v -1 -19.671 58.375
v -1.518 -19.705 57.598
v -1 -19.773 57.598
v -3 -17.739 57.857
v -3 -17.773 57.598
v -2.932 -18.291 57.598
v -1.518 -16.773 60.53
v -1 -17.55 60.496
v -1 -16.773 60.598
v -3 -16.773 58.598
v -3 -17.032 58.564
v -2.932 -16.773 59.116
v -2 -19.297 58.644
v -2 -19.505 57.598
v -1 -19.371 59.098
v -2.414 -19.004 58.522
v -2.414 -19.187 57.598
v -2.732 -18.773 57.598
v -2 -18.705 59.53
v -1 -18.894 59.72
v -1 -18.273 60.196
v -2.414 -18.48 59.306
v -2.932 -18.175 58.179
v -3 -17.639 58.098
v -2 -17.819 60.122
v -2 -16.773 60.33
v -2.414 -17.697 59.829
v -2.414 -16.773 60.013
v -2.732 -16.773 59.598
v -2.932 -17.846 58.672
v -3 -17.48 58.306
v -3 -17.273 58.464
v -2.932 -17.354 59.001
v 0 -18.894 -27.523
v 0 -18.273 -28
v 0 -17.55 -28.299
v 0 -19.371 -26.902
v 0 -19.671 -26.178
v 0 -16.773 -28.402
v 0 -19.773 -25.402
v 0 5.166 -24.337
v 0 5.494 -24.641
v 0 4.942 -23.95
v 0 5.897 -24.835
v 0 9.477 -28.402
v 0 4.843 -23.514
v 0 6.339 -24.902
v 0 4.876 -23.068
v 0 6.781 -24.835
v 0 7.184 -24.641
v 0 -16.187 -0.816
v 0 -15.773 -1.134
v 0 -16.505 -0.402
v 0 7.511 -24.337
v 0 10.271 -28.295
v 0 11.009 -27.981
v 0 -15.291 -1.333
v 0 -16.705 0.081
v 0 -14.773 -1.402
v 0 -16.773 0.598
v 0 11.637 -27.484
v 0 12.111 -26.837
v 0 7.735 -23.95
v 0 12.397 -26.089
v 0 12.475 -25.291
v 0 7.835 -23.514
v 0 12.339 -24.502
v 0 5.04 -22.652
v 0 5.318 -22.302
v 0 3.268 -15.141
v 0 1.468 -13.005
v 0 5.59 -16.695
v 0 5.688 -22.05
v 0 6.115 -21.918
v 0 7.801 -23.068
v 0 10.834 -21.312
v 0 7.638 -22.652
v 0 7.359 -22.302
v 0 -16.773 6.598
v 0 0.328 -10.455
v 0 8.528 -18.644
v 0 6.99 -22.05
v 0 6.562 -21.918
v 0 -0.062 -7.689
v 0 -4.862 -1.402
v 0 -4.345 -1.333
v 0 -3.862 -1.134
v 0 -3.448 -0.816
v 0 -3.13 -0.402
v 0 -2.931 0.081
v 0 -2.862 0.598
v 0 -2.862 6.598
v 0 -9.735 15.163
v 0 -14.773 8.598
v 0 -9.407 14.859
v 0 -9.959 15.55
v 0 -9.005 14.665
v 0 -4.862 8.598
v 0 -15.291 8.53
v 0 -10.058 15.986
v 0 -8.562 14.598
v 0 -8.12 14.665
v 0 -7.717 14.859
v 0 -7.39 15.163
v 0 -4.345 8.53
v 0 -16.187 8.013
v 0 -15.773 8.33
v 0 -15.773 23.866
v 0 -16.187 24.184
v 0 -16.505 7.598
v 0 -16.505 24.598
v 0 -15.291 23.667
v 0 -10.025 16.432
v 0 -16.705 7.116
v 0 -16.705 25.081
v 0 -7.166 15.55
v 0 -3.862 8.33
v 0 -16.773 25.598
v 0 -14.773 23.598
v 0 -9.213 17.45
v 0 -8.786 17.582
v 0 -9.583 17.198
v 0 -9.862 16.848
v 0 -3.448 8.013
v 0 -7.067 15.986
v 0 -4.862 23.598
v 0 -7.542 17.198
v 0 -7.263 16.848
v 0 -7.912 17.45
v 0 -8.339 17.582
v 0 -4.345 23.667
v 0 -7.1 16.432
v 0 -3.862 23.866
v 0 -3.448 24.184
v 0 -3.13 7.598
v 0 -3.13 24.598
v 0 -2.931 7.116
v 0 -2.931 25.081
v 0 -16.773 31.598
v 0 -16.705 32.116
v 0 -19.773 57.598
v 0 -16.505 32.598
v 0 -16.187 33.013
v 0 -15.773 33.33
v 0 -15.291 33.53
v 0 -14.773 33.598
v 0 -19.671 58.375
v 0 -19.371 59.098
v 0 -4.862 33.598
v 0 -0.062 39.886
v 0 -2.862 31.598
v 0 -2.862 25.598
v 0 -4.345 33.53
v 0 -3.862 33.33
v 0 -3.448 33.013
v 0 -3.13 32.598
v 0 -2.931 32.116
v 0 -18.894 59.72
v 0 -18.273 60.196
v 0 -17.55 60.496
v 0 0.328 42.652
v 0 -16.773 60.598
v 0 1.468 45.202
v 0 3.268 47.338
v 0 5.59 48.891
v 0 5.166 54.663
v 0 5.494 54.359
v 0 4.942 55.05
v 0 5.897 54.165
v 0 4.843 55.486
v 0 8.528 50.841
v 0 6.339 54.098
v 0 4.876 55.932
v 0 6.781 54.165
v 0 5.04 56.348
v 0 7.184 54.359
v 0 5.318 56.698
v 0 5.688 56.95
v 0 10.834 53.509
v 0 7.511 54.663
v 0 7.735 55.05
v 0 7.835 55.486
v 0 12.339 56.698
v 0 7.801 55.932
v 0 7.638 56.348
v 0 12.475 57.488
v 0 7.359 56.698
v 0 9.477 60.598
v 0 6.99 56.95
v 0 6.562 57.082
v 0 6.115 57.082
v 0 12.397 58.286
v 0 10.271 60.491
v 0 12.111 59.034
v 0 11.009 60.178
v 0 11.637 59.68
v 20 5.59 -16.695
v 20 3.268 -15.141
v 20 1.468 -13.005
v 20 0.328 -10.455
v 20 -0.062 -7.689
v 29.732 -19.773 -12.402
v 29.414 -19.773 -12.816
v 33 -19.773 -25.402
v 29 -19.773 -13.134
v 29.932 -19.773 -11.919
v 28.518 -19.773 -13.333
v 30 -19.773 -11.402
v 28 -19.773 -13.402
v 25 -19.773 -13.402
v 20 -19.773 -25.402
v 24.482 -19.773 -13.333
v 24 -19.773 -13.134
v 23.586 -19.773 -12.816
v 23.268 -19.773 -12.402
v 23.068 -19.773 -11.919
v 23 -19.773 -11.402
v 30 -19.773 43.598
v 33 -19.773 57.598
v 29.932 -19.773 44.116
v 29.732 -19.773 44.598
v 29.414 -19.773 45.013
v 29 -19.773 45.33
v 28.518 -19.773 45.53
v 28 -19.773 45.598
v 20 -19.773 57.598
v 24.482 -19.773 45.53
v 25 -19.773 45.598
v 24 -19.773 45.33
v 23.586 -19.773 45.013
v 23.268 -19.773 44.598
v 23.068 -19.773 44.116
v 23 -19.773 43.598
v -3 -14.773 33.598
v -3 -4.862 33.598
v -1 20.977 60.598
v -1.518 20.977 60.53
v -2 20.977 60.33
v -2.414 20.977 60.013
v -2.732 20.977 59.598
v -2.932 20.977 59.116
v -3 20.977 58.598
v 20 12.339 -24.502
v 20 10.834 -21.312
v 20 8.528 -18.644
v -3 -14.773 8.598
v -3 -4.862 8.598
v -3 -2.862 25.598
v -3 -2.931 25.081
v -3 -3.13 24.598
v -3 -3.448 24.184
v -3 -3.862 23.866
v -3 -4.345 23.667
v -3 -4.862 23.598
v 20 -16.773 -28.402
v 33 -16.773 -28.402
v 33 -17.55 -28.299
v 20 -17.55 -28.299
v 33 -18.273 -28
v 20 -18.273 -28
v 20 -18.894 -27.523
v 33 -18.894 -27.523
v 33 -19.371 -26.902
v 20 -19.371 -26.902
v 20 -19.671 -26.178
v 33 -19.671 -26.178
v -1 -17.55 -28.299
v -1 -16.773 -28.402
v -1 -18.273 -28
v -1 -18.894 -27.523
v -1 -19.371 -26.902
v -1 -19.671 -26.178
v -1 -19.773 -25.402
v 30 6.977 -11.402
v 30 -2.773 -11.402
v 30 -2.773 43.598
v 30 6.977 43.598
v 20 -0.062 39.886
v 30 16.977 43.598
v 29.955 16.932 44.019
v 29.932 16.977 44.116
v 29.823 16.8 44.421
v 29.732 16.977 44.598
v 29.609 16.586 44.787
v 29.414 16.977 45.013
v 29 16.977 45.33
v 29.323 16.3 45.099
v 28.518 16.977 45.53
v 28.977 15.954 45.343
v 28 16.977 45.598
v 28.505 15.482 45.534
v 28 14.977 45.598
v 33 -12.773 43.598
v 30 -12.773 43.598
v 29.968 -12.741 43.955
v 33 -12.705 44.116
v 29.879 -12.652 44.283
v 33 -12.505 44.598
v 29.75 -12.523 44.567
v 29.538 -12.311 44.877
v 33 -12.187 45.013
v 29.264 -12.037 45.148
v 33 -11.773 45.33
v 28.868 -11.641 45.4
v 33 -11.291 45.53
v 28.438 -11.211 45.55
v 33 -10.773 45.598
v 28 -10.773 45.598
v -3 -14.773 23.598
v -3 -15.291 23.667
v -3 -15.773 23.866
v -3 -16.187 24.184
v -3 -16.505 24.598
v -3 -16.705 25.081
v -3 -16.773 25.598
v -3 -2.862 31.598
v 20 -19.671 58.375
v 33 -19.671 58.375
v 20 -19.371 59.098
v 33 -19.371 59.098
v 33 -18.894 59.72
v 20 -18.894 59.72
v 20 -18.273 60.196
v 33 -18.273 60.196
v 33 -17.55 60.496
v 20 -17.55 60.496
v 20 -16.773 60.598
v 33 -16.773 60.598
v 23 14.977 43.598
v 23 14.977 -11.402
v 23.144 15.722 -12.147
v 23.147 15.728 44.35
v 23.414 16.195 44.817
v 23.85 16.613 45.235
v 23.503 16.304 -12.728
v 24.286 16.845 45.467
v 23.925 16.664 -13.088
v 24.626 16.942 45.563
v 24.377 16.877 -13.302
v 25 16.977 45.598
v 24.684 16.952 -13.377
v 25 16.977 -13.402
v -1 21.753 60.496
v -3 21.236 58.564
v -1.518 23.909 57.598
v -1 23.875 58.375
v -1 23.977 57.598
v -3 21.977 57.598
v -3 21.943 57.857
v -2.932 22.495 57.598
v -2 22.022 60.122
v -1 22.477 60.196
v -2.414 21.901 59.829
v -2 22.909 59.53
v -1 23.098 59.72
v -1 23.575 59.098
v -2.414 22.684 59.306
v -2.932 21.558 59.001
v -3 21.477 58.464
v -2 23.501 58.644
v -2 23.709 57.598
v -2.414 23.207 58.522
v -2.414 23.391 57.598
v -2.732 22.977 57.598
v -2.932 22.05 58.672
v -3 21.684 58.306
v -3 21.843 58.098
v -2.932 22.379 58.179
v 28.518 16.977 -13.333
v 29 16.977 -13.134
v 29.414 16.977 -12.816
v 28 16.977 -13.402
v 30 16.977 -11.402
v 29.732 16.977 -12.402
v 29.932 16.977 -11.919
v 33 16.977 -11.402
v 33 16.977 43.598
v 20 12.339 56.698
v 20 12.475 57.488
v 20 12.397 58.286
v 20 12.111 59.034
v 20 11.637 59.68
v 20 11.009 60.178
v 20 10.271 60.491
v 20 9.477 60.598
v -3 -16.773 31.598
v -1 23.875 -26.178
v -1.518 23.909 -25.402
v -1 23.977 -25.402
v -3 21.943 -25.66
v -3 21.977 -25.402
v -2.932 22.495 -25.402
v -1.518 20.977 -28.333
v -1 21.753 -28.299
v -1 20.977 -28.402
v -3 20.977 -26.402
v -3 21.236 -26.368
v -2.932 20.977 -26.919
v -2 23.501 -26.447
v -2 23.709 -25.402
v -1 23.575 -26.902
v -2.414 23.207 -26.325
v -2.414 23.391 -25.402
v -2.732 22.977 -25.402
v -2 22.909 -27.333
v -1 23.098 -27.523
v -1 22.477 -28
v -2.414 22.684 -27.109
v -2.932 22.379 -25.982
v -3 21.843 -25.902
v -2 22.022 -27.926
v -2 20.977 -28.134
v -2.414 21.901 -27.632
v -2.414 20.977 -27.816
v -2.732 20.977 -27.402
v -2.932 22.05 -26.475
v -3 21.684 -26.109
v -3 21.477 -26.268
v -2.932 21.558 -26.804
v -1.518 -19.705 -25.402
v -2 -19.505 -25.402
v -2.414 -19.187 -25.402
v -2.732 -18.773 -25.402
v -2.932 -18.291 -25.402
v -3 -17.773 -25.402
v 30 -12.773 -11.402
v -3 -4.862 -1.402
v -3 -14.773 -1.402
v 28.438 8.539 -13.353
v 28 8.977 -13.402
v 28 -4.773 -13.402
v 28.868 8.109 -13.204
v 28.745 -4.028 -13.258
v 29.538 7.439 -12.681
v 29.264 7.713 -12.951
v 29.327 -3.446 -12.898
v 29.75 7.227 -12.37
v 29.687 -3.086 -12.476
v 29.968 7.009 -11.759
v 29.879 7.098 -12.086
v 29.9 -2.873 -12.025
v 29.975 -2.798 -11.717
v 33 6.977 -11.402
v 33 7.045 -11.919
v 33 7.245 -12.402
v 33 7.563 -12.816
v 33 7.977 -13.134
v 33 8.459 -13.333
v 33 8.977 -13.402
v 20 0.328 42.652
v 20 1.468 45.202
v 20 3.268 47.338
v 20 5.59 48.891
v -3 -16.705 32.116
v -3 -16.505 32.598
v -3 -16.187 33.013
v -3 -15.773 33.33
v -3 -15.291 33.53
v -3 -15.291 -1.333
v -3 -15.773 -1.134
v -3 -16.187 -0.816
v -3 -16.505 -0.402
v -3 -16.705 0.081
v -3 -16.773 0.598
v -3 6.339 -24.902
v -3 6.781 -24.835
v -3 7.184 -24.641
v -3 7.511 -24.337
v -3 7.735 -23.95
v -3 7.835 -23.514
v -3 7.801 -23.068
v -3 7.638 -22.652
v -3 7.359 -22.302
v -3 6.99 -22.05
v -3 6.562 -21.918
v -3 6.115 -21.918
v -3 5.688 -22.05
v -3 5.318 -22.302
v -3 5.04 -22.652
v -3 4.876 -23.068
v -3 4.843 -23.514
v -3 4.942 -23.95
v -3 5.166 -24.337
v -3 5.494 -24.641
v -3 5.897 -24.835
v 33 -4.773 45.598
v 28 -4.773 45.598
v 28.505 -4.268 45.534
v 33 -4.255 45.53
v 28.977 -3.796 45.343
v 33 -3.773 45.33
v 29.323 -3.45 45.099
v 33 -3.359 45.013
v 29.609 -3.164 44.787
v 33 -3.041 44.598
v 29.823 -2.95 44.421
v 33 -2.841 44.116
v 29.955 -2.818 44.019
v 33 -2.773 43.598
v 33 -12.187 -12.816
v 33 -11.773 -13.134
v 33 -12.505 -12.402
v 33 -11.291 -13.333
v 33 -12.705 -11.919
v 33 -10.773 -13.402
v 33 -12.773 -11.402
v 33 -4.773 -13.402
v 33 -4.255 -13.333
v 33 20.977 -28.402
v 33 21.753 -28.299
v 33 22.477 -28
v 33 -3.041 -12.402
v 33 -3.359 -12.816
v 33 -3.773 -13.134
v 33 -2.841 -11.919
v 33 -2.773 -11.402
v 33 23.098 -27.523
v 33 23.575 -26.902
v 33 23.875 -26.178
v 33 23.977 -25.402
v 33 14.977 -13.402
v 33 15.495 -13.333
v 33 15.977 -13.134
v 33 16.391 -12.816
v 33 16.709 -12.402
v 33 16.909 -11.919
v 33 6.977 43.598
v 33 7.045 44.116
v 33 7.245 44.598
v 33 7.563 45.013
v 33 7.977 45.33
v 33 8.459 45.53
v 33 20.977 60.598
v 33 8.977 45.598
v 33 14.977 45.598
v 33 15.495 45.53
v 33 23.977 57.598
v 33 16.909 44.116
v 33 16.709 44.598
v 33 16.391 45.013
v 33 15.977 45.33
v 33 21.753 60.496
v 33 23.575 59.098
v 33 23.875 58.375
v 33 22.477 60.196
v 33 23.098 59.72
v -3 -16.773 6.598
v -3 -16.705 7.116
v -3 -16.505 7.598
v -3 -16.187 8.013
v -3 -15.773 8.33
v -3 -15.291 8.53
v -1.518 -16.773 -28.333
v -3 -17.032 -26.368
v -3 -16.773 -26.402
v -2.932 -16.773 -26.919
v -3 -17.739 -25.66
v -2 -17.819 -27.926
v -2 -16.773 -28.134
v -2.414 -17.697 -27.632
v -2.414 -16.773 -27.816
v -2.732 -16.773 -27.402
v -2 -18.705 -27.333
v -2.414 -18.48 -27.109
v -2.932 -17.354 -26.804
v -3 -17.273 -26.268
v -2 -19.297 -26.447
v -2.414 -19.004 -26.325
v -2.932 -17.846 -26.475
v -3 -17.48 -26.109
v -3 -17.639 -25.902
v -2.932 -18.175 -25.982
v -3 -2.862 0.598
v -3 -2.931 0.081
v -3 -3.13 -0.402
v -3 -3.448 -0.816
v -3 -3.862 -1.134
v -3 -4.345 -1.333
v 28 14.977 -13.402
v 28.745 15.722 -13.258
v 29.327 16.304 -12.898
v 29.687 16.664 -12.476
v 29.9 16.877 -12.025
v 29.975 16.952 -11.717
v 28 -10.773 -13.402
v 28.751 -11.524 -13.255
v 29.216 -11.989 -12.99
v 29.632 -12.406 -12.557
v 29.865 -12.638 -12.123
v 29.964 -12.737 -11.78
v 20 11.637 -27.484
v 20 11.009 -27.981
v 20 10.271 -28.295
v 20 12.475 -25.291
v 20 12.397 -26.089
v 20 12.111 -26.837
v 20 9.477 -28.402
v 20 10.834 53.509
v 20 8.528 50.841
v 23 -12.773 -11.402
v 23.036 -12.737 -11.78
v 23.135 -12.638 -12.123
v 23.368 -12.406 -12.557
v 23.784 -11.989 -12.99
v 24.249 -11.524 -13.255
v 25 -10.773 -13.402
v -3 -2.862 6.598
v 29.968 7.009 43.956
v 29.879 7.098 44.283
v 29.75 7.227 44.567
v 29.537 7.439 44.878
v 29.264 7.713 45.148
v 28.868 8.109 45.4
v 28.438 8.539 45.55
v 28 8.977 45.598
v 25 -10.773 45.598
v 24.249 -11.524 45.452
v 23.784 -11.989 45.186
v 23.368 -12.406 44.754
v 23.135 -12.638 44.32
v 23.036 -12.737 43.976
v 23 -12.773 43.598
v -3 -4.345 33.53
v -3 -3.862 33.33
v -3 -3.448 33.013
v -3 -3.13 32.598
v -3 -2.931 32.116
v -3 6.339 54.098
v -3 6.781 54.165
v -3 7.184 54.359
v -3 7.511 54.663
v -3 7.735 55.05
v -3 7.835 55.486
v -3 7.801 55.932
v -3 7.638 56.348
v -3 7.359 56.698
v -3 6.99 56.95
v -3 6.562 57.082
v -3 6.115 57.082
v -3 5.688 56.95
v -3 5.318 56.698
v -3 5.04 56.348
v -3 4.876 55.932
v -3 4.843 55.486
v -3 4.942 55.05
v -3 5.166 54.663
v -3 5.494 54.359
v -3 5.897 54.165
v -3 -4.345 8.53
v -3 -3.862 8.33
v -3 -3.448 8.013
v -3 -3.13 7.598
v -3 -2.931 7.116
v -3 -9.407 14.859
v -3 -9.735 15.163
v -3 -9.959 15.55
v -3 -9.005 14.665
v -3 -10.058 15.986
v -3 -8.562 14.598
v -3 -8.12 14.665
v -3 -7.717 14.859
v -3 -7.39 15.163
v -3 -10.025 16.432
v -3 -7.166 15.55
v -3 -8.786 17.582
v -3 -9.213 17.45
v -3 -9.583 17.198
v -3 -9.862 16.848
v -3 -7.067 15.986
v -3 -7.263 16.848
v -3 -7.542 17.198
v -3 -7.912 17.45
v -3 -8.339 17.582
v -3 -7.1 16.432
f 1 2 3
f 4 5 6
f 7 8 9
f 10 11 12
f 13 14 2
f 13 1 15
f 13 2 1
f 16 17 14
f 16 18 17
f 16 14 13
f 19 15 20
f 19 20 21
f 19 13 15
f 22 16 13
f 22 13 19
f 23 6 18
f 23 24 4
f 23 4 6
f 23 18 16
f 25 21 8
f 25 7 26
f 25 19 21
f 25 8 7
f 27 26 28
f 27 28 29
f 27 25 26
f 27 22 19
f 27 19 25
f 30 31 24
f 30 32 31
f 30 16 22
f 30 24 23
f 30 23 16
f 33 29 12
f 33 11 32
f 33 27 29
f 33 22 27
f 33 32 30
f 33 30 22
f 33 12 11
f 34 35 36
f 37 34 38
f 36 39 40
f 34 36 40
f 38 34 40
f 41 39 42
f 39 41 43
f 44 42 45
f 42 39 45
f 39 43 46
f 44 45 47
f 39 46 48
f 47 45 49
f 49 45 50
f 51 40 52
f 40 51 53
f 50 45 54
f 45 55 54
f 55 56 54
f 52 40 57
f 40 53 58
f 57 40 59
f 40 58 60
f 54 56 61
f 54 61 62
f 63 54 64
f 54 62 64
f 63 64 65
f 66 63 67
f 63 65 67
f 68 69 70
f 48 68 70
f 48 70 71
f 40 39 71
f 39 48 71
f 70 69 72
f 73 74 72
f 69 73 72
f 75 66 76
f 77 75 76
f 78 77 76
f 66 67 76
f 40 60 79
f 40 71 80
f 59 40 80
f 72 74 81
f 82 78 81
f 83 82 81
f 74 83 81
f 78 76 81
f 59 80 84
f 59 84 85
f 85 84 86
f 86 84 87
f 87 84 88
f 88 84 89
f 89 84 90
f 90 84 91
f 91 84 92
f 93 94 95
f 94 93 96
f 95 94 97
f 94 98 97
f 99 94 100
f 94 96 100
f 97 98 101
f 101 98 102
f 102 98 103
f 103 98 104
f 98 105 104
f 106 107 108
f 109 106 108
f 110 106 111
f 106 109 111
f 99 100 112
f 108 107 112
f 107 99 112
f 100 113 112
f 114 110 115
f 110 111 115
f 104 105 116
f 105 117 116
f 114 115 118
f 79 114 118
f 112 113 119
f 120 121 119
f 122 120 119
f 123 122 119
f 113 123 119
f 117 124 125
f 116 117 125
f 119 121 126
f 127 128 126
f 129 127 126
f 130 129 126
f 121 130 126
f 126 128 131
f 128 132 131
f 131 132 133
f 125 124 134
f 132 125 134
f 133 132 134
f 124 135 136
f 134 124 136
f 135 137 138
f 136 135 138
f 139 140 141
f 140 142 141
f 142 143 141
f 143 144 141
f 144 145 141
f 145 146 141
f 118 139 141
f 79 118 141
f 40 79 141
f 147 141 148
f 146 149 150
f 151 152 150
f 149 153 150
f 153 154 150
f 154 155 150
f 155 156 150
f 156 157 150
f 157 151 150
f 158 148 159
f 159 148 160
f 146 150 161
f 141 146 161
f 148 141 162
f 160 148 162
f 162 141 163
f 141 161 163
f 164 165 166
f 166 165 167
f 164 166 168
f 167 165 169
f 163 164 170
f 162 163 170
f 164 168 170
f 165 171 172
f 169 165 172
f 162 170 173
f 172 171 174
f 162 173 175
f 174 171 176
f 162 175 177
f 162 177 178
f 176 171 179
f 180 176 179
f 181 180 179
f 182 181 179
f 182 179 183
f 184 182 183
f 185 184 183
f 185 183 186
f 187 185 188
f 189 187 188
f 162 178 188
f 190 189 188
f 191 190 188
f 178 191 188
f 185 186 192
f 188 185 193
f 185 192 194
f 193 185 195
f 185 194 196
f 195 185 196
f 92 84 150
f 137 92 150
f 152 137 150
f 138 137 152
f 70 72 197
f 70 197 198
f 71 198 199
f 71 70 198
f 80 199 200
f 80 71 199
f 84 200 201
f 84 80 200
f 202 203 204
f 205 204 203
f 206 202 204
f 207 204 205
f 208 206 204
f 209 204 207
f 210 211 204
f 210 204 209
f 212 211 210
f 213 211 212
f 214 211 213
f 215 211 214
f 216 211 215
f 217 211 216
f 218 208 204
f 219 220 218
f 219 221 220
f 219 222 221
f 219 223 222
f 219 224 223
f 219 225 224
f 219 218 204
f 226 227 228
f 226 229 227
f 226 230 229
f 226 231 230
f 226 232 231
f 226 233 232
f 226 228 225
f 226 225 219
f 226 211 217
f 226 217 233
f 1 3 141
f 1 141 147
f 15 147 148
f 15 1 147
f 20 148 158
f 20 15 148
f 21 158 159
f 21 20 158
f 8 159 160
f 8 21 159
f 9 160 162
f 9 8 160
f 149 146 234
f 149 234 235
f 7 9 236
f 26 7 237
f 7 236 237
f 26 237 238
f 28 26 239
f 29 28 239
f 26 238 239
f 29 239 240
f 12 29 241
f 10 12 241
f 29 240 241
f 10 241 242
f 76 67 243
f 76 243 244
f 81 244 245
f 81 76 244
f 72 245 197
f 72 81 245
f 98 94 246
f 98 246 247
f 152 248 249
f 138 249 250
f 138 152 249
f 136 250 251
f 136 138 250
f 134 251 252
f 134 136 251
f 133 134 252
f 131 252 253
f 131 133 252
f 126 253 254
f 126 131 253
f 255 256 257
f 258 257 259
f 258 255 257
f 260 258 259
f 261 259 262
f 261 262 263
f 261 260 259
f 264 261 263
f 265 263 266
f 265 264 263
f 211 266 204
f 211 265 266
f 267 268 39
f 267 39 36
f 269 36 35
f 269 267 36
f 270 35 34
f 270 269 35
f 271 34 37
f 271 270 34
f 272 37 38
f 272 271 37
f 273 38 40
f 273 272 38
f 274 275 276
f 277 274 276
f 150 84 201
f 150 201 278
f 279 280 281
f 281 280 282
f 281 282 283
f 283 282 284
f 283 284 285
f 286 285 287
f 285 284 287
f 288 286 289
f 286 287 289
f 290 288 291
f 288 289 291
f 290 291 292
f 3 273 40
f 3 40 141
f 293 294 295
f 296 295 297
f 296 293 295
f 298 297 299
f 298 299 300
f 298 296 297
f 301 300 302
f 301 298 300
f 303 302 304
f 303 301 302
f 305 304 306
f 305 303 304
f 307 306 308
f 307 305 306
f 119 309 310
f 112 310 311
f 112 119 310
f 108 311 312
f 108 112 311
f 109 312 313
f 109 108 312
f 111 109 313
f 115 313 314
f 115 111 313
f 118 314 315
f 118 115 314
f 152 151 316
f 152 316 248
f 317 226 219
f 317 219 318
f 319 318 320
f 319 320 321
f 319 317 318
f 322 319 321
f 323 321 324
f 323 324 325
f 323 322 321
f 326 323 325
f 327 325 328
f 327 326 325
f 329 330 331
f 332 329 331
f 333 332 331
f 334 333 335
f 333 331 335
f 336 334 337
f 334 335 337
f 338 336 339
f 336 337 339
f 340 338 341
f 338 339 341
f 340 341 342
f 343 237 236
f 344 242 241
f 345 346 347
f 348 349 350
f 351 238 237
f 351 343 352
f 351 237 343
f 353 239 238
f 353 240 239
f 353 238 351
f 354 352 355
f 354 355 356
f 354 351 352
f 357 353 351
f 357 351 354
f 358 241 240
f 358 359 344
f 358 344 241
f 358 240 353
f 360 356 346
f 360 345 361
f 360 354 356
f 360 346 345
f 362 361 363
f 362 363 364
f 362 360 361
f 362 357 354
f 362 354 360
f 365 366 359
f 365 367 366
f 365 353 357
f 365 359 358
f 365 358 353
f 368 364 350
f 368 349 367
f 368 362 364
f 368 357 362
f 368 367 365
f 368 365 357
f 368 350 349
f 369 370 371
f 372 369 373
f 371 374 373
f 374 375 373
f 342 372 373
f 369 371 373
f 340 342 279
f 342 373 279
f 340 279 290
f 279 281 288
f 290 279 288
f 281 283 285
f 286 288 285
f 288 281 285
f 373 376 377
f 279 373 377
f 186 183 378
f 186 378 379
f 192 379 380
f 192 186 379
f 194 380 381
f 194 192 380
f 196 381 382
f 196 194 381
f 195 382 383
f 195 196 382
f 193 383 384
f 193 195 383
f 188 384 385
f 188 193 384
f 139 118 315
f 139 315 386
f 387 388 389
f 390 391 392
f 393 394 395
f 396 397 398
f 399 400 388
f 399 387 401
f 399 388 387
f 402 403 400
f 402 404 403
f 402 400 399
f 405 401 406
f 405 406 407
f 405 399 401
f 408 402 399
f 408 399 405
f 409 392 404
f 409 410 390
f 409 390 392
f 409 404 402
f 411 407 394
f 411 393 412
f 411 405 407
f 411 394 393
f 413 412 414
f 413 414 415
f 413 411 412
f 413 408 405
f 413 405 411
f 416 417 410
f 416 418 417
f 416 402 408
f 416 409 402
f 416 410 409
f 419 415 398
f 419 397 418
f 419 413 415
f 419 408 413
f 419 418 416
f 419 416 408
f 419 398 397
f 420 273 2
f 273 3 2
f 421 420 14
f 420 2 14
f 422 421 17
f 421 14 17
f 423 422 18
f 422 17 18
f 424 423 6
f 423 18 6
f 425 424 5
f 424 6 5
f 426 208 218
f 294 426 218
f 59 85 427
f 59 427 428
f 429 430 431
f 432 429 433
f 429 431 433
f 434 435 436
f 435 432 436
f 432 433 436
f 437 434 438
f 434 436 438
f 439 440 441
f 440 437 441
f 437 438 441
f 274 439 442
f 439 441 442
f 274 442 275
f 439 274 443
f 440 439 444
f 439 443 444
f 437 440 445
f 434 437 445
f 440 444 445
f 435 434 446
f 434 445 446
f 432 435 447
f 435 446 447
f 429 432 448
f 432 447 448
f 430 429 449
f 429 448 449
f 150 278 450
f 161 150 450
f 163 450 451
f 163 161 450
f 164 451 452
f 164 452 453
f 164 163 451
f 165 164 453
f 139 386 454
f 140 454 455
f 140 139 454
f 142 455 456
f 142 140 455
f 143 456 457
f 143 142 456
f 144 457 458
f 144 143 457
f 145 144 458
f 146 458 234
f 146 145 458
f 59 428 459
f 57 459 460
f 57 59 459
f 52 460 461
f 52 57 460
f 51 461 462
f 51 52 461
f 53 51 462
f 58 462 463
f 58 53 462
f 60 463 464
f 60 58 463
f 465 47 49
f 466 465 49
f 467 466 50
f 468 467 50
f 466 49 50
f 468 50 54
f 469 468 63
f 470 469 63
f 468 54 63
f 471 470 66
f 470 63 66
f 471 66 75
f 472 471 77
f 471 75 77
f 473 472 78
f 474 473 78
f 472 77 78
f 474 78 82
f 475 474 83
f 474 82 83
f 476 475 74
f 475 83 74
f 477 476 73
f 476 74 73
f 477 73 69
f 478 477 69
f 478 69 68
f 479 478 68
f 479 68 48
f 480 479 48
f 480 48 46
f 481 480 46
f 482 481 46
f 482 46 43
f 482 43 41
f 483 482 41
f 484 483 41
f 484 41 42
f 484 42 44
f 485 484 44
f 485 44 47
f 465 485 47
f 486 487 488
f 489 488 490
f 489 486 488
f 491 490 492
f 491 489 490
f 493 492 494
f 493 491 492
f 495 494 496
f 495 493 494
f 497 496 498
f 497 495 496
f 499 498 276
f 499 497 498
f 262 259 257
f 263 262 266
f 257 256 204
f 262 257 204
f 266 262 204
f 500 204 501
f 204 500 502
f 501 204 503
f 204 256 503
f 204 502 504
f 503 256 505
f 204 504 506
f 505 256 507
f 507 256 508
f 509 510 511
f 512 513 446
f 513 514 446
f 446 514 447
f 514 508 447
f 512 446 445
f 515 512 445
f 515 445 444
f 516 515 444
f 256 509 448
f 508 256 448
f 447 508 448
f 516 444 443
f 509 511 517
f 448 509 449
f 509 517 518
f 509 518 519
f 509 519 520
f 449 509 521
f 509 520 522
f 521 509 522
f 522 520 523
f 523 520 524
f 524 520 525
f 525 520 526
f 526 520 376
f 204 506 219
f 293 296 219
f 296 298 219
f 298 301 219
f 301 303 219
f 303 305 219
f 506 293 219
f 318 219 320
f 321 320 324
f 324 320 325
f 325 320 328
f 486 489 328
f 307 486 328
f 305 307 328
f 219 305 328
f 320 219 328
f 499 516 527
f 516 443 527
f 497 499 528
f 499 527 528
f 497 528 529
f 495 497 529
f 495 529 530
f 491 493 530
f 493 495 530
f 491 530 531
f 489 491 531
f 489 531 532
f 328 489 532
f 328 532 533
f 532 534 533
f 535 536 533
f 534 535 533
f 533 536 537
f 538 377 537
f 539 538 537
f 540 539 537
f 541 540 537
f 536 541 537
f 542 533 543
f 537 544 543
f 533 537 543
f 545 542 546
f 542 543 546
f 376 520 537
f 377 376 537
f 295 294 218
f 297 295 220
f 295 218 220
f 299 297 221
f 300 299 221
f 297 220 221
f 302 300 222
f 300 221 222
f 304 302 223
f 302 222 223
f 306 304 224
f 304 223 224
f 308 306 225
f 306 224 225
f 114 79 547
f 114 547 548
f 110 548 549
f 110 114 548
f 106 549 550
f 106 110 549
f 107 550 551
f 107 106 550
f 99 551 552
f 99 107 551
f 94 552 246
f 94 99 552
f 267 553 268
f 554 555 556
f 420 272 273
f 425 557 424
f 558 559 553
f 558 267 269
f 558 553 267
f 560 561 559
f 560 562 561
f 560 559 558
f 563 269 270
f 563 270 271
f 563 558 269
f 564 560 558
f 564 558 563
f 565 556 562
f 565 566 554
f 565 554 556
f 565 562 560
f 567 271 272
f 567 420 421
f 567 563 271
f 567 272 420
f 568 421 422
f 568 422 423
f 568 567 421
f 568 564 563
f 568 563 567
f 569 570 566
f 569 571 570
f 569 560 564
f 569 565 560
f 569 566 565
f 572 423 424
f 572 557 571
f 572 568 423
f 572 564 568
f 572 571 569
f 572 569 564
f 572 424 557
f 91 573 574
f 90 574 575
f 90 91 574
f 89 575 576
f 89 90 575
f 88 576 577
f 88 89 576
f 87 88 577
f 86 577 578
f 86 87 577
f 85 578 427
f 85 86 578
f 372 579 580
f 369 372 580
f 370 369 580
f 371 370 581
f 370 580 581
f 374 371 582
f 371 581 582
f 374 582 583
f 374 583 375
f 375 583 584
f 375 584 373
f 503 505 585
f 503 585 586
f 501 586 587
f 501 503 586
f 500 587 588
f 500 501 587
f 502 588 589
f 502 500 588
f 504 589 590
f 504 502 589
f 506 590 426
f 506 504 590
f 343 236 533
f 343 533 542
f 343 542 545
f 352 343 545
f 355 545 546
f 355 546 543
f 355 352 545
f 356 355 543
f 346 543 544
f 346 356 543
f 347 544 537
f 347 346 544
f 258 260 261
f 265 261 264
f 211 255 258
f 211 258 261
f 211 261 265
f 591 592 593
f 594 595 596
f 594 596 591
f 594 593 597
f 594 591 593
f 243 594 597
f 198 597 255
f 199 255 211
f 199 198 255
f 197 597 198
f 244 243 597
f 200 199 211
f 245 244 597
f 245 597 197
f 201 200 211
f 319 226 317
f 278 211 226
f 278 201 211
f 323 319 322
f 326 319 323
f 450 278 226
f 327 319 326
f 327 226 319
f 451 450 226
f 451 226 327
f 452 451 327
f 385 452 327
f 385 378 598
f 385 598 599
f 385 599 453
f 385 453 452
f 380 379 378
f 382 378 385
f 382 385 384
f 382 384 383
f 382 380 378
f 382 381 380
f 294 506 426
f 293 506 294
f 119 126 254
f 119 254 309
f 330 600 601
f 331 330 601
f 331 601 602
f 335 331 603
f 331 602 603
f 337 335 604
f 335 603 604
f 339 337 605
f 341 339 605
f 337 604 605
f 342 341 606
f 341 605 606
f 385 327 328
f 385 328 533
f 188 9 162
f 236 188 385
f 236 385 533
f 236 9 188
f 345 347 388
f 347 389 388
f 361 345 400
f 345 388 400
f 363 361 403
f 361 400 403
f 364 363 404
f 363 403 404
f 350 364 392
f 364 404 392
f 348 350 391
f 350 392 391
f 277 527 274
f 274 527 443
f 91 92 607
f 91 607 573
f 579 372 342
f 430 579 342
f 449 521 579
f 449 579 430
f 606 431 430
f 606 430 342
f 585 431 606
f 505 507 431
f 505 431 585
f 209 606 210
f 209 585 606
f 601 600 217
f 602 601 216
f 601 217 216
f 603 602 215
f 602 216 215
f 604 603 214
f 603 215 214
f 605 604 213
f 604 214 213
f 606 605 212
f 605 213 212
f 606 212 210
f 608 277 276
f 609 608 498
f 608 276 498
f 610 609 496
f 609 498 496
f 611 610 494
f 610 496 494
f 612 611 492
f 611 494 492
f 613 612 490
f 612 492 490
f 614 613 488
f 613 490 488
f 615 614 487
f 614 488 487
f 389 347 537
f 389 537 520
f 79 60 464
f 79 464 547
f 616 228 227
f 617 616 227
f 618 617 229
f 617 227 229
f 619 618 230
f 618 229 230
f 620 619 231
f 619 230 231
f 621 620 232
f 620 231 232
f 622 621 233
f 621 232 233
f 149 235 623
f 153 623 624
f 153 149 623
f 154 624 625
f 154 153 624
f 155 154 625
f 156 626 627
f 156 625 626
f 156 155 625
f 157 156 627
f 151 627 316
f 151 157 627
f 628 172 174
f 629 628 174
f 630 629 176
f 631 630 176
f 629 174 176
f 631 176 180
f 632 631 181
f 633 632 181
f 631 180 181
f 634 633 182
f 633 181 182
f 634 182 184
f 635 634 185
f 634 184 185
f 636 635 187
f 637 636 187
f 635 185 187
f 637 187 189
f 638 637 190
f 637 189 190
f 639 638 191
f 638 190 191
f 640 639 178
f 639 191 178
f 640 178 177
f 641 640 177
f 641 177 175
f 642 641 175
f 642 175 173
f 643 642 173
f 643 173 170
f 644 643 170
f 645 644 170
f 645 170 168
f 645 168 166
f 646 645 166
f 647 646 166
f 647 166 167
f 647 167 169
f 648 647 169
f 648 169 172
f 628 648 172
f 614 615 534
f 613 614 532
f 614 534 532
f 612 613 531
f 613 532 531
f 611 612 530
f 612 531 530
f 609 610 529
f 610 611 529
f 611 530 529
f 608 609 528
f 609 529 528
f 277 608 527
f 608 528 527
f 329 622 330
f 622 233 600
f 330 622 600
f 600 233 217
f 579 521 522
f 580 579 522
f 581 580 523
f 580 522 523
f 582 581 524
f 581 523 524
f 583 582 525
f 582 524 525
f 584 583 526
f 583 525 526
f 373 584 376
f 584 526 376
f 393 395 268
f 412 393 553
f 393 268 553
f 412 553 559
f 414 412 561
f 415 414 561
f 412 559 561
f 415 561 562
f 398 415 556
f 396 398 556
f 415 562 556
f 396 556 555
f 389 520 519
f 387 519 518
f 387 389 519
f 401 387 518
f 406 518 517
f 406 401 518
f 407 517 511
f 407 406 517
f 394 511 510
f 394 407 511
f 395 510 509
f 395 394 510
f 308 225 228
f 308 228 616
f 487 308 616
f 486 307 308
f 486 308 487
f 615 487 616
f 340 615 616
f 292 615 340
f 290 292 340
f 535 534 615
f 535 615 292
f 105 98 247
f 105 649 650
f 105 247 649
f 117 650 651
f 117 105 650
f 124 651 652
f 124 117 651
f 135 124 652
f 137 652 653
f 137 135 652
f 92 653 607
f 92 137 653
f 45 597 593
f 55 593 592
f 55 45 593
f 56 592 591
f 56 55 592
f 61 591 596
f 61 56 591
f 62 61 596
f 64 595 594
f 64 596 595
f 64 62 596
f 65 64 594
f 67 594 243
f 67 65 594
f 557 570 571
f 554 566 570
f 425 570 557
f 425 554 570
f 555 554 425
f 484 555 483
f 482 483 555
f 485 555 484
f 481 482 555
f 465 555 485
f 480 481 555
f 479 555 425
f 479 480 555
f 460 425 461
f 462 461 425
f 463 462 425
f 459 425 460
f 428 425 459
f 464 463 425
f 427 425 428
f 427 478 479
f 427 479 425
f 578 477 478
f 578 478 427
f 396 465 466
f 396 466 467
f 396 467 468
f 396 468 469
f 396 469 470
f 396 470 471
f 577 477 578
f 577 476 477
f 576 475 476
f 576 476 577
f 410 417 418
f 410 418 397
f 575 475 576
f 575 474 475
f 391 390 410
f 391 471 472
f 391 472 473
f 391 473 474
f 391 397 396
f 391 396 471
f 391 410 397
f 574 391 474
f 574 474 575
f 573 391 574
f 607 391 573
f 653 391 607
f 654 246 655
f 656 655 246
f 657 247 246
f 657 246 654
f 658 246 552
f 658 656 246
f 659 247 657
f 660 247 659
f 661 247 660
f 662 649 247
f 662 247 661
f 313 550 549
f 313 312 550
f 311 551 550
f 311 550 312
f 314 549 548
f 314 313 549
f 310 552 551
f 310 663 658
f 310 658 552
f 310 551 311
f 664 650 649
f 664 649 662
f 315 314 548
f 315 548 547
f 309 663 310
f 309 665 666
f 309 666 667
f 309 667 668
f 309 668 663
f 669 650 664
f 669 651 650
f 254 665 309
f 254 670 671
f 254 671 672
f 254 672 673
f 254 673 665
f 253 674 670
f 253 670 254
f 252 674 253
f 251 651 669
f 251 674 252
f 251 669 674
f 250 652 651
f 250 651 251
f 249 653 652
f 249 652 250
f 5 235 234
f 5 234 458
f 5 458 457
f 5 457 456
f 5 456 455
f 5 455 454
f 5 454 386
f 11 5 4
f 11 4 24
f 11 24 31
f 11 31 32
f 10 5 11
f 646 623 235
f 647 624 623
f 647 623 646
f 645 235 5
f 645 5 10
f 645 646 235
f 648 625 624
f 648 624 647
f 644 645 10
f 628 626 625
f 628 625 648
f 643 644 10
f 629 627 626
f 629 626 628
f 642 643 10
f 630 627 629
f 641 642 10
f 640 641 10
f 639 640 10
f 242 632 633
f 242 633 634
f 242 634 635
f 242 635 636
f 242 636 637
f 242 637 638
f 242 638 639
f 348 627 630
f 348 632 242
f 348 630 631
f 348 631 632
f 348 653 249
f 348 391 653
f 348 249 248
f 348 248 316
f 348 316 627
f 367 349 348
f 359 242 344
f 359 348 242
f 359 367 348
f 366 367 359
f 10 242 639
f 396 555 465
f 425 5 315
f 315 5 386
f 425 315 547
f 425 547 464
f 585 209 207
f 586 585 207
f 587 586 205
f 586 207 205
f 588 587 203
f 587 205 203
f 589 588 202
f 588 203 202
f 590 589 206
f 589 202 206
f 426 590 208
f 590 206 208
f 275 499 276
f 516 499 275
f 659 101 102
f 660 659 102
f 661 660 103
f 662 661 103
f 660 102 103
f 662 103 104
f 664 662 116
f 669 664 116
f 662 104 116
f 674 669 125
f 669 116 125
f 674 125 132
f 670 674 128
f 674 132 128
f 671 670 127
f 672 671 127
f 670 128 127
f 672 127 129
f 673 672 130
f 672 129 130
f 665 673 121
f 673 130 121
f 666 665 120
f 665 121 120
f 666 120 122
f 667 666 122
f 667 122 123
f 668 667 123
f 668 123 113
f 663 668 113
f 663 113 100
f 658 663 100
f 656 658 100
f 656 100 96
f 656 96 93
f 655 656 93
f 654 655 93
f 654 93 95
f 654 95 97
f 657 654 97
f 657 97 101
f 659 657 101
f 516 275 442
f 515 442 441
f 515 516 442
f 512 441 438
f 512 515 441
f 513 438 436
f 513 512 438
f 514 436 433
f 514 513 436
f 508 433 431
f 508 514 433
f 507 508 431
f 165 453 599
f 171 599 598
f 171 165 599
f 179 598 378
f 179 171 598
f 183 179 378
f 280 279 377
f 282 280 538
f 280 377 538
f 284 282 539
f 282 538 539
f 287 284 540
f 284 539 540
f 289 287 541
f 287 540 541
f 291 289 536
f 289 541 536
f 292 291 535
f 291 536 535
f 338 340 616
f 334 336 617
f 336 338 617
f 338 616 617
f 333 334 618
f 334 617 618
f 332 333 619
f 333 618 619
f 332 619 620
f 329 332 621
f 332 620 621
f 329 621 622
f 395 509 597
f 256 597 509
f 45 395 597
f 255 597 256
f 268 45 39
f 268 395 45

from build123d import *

# Parameters (mm, degrees)
RESSALTO_EXTRUS_O2_DEPTH      = 30
RESSALTO_EXTRUS_O3_START      = 3
RESSALTO_EXTRUS_O3_DEPTH      = 3
RESSALTO_EXTRUS_O4_DEPTH      = 3
RESSALTO_EXTRUS_O4_DEPTH_BACK = 10
CORTE_EXTRUS_O1_DEPTH         = 10
CORTE_EXTRUS_O2_REACH         = 83.702
FILETE1_START                 = -19.773073923
FILETE1_DEPTH                 = 36.75
FILETE1_START_2               = -13.40159992
FILETE1_2_DEPTH               = 59
ESBO_O10_R                    = 1.5
CORTE_EXTRUS_O3_DEPTH         = 10
CORTE_EXTRUS_O4_DEPTH         = 10
FILETE2_R                     = 2


with BuildPart() as part:
    # Esboço2 → Ressalto-extrusão2 (new body)
    with BuildSketch(Plane(origin=(0, 0, 0), x_dir=(0, 0, -1), z_dir=(1, 0, 0))):
        with BuildLine():
            Line((2.90159992, -0.062465938), (-35.09840008, -0.062465938))
            Line((-35.09840008, -0.062465938), (-39.886084903, -0.062465938))
            ThreePointArc((-39.886084903, -0.062465938), (-45.202180234, 1.467638524), (-48.891439328, 5.589707975))
            ThreePointArc((-48.891439328, 5.589707975), (-52.096536948, 9.772081499), (-56.69840008, 12.338743681))
            ThreePointArc((-56.69840008, 12.338743681), (-59.373224015, 11.895603401), (-60.59840008, 9.476926077))
            Line((-60.59840008, 9.476926077), (-60.59840008, 20.976926077))
            ThreePointArc((-60.59840008, 20.976926077), (-59.719720424, 23.09824642), (-57.59840008, 23.976926077))
            Line((-57.59840008, 23.976926077), (25.40159992, 23.976926077))
            ThreePointArc((25.40159992, 23.976926077), (27.522920263, 23.09824642), (28.40159992, 20.976926077))
            Line((28.40159992, 20.976926077), (28.40159992, 9.476926077))
            ThreePointArc((28.40159992, 9.476926077), (27.176423855, 11.895603401), (24.50159992, 12.338743681))
            ThreePointArc((24.50159992, 12.338743681), (19.899736788, 9.772081499), (16.694639168, 5.589707975))
            ThreePointArc((16.694639168, 5.589707975), (13.005380073, 1.467638524), (7.689284743, -0.062465938))
            Line((7.689284743, -0.062465938), (2.90159992, -0.062465938))
        make_face()
    extrude(amount=RESSALTO_EXTRUS_O2_DEPTH)

    # Esboço3 → Ressalto-extrusão3 (add)
    with BuildSketch(Plane.ZY.offset(RESSALTO_EXTRUS_O3_START)):
        with BuildLine():
            Line((60.59840008, 15.226926077), (60.59840008, 20.976926077))
            ThreePointArc((60.59840008, 20.976926077), (59.719720424, 23.09824642), (57.59840008, 23.976926077))
            Line((57.59840008, 23.976926077), (16.09840008, 23.976926077))
            Line((16.09840008, 23.976926077), (-25.40159992, 23.976926077))
            ThreePointArc((-25.40159992, 23.976926077), (-27.522920263, 23.09824642), (-28.40159992, 20.976926077))
            Line((-28.40159992, 20.976926077), (-28.40159992, 15.226926077))
            Line((-28.40159992, 15.226926077), (-28.40159992, -16.773073923))
            ThreePointArc((-28.40159992, -16.773073923), (-27.522920263, -18.894394267), (-25.40159992, -19.773073923))
            Line((-25.40159992, -19.773073923), (57.59840008, -19.773073923))
            ThreePointArc((57.59840008, -19.773073923), (59.719720424, -18.894394267), (60.59840008, -16.773073923))
            Line((60.59840008, -16.773073923), (60.59840008, 15.226926077))
        make_face()
    extrude(amount=-RESSALTO_EXTRUS_O3_DEPTH)

    # Esboço4 → Ressalto-extrusão4 (add, two sides: drawn at the far end of the back side and taken through both)
    with BuildSketch(Plane(origin=(30, 0, 0), x_dir=(0, 0, -1), z_dir=(1, 0, 0)).offset(-RESSALTO_EXTRUS_O4_DEPTH_BACK)):
        with BuildLine():
            Line((-16.09840008, 23.976926077), (25.40159992, 23.976926077))
            ThreePointArc((25.40159992, 23.976926077), (27.522920263, 23.09824642), (28.40159992, 20.976926077))
            Line((28.40159992, 20.976926077), (28.40159992, 15.226926077))
            Line((28.40159992, 15.226926077), (28.40159992, -16.773073923))
            ThreePointArc((28.40159992, -16.773073923), (27.522920263, -18.894394267), (25.40159992, -19.773073923))
            Line((25.40159992, -19.773073923), (-57.59840008, -19.773073923))
            ThreePointArc((-57.59840008, -19.773073923), (-59.719720424, -18.894394267), (-60.59840008, -16.773073923))
            Line((-60.59840008, -16.773073923), (-60.59840008, 15.226926077))
            Line((-60.59840008, 15.226926077), (-60.59840008, 20.976926077))
            ThreePointArc((-60.59840008, 20.976926077), (-59.719720424, 23.09824642), (-57.59840008, 23.976926077))
            Line((-57.59840008, 23.976926077), (-16.09840008, 23.976926077))
        make_face()
    extrude(amount=RESSALTO_EXTRUS_O4_DEPTH + RESSALTO_EXTRUS_O4_DEPTH_BACK)

    # Esboço8 → Corte-extrusão1 (cut)
    with BuildSketch(Plane(origin=(33, 0, 0), x_dir=(0, 0, -1), z_dir=(1, 0, 0))):
        with BuildLine():
            Line((-43.59840008, -2.773073923), (11.40159992, -2.773073923))
            ThreePointArc((11.40159992, -2.773073923), (12.815813482, -3.358860361), (13.40159992, -4.773073923))
            Line((13.40159992, -4.773073923), (13.40159992, -10.773073923))
            ThreePointArc((13.40159992, -10.773073923), (12.815813482, -12.187287486), (11.40159992, -12.773073923))
            Line((11.40159992, -12.773073923), (-43.59840008, -12.773073923))
            ThreePointArc((-43.59840008, -12.773073923), (-45.012613643, -12.187287486), (-45.59840008, -10.773073923))
            Line((-45.59840008, -10.773073923), (-45.59840008, -4.773073923))
            ThreePointArc((-45.59840008, -4.773073923), (-45.012613643, -3.358860361), (-43.59840008, -2.773073923))
        make_face()
        with BuildLine():
            Line((-43.59840008, 6.976926077), (11.40159992, 6.976926077))
            ThreePointArc((11.40159992, 6.976926077), (12.815813482, 7.562712514), (13.40159992, 8.976926077))
            Line((13.40159992, 8.976926077), (13.40159992, 14.976926077))
            ThreePointArc((13.40159992, 14.976926077), (12.815813482, 16.391139639), (11.40159992, 16.976926077))
            Line((11.40159992, 16.976926077), (-43.59840008, 16.976926077))
            ThreePointArc((-43.59840008, 16.976926077), (-45.012613643, 16.391139639), (-45.59840008, 14.976926077))
            Line((-45.59840008, 14.976926077), (-45.59840008, 8.976926077))
            ThreePointArc((-45.59840008, 8.976926077), (-45.012613643, 7.562712514), (-43.59840008, 6.976926077))
        make_face()
    extrude(amount=-CORTE_EXTRUS_O1_DEPTH, mode=Mode.SUBTRACT)

    # Corte-extrusão2: up to this face of the body (flat: up to its plane)
    corte_extrus_o2_end = Plane(part.part.faces().sort_by_distance((28, 16.976926077, 16.09840008))[0])
    # Esboço9 → Corte-extrusão2 (cut, up to the picked face)
    with BuildSketch(Plane(origin=(0, -19.773073923, 0), x_dir=(-1, 0, 0), z_dir=(0, -1, 0)), mode=Mode.PRIVATE) as corte_extrus_o2_sk1:
        with BuildLine():
            Line((-25, 13.40159992), (-28, 13.40159992))
            ThreePointArc((-28, 13.40159992), (-29.414213562, 12.815813482), (-30, 11.40159992))
            Line((-30, 11.40159992), (-30, -43.59840008))
            ThreePointArc((-30, -43.59840008), (-29.414213562, -45.012613643), (-28, -45.59840008))
            Line((-28, -45.59840008), (-25, -45.59840008))
            ThreePointArc((-25, -45.59840008), (-23.585786438, -45.012613643), (-23, -43.59840008))
            Line((-23, -43.59840008), (-23, 11.40159992))
            ThreePointArc((-23, 11.40159992), (-23.585786438, 12.815813482), (-25, 13.40159992))
        make_face()
    corte_extrus_o2_tool1 = split(extrude(corte_extrus_o2_sk1.sketch, amount=-CORTE_EXTRUS_O2_REACH, mode=Mode.PRIVATE), bisect_by=corte_extrus_o2_end, keep=Keep.BOTH, mode=Mode.PRIVATE)
    add(corte_extrus_o2_tool1.solids().sort_by(Axis((26.5, -19.773074, 16.0984), (0, 1, 0)))[0], mode=Mode.SUBTRACT)

    # Filete1: read off the stored shape, not the designer's step
    # Filete1 outline → Filete1 (add)
    with BuildSketch(Plane(origin=(0, 0, 0), x_dir=(1, 0, 0), z_dir=(0, 1, 0)).offset(FILETE1_START)):
        with BuildLine():
            ThreePointArc((25, -45.59840008), (23.585786437, -45.012613642), (23, -43.59840008))
            Line((23, -43.59840008), (23, -45.59840008))
            Line((23, -45.59840008), (25, -45.59840008))
        make_face()
        with BuildLine():
            ThreePointArc((23, 11.40159992), (23.585786438, 12.815813482), (25, 13.40159992))
            Line((25, 13.40159992), (23, 13.40159992))
            Line((23, 13.40159992), (23, 11.40159992))
        make_face()
    extrude(amount=FILETE1_DEPTH)

    # Filete1 2 outline → Filete1 2 (add)
    with BuildSketch(Plane.XY.offset(FILETE1_START_2)):
        with BuildLine():
            ThreePointArc((23, 14.976926077), (23.585786438, 16.391139639), (25, 16.976926077))
            Line((25, 16.976926077), (23, 16.976926077))
            Line((23, 16.976926077), (23, 14.976926077))
        make_face()
    extrude(amount=FILETE1_2_DEPTH)

    # Esboço10 → Corte-extrusão3 (cut)
    with BuildSketch(Plane(origin=(0, 0, 0), x_dir=(0, 0, -1), z_dir=(1, 0, 0))):
        with Locations((-55.59840008, 6.338743681)):
            Circle(ESBO_O10_R)
        with Locations((23.40159992, 6.338743681)):
            Circle(ESBO_O10_R)
        with Locations((-16.09840008, -8.562465938)):
            Circle(ESBO_O10_R)
    extrude(amount=-CORTE_EXTRUS_O3_DEPTH, mode=Mode.SUBTRACT)

    # Esboço12 → Corte-extrusão4 (cut)
    with BuildSketch(Plane(origin=(0, 0, 0), x_dir=(0, 0, -1), z_dir=(1, 0, 0))):
        with BuildLine():
            Line((-31.59840008, -2.862465938), (-25.59840008, -2.862465938))
            ThreePointArc((-25.59840008, -2.862465938), (-24.184186518, -3.448252375), (-23.59840008, -4.862465938))
            Line((-23.59840008, -4.862465938), (-23.59840008, -14.773073923))
            ThreePointArc((-23.59840008, -14.773073923), (-24.184186518, -16.187287486), (-25.59840008, -16.773073923))
            Line((-25.59840008, -16.773073923), (-31.59840008, -16.773073923))
            ThreePointArc((-31.59840008, -16.773073923), (-33.012613643, -16.187287486), (-33.59840008, -14.773073923))
            Line((-33.59840008, -14.773073923), (-33.59840008, -4.862465938))
            ThreePointArc((-33.59840008, -4.862465938), (-33.012613643, -3.448252375), (-31.59840008, -2.862465938))
        make_face()
        with BuildLine():
            Line((-6.59840008, -2.862465938), (-0.59840008, -2.862465938))
            ThreePointArc((-0.59840008, -2.862465938), (0.815813482, -3.448252375), (1.40159992, -4.862465938))
            Line((1.40159992, -4.862465938), (1.40159992, -14.773073923))
            ThreePointArc((1.40159992, -14.773073923), (0.815813482, -16.187287486), (-0.59840008, -16.773073923))
            Line((-0.59840008, -16.773073923), (-6.59840008, -16.773073923))
            ThreePointArc((-6.59840008, -16.773073923), (-8.012613643, -16.187287486), (-8.59840008, -14.773073923))
            Line((-8.59840008, -14.773073923), (-8.59840008, -4.862465938))
            ThreePointArc((-8.59840008, -4.862465938), (-8.012613643, -3.448252375), (-6.59840008, -2.862465938))
        make_face()
    extrude(amount=-CORTE_EXTRUS_O4_DEPTH, mode=Mode.SUBTRACT)

    # Filete2
    filete2_edges = [part.edges().sort_by_distance(p)[0] for p in [
        (-3, 2.101926077, 60.59840008),
        (-3, 23.09824642, 59.719720424),
        (-3, 23.976926077, 16.09840008),
        (-3, 23.09824642, -27.522920263),
        (-3, 2.101926077, -28.40159992),
        (-3, -18.894394267, -27.522920263),
        (-3, -19.773073923, 16.09840008),
        (-3, -18.894394267, 59.719720424),
    ]]
    fillet(filete2_edges, radius=FILETE2_R)


solid = part.part
